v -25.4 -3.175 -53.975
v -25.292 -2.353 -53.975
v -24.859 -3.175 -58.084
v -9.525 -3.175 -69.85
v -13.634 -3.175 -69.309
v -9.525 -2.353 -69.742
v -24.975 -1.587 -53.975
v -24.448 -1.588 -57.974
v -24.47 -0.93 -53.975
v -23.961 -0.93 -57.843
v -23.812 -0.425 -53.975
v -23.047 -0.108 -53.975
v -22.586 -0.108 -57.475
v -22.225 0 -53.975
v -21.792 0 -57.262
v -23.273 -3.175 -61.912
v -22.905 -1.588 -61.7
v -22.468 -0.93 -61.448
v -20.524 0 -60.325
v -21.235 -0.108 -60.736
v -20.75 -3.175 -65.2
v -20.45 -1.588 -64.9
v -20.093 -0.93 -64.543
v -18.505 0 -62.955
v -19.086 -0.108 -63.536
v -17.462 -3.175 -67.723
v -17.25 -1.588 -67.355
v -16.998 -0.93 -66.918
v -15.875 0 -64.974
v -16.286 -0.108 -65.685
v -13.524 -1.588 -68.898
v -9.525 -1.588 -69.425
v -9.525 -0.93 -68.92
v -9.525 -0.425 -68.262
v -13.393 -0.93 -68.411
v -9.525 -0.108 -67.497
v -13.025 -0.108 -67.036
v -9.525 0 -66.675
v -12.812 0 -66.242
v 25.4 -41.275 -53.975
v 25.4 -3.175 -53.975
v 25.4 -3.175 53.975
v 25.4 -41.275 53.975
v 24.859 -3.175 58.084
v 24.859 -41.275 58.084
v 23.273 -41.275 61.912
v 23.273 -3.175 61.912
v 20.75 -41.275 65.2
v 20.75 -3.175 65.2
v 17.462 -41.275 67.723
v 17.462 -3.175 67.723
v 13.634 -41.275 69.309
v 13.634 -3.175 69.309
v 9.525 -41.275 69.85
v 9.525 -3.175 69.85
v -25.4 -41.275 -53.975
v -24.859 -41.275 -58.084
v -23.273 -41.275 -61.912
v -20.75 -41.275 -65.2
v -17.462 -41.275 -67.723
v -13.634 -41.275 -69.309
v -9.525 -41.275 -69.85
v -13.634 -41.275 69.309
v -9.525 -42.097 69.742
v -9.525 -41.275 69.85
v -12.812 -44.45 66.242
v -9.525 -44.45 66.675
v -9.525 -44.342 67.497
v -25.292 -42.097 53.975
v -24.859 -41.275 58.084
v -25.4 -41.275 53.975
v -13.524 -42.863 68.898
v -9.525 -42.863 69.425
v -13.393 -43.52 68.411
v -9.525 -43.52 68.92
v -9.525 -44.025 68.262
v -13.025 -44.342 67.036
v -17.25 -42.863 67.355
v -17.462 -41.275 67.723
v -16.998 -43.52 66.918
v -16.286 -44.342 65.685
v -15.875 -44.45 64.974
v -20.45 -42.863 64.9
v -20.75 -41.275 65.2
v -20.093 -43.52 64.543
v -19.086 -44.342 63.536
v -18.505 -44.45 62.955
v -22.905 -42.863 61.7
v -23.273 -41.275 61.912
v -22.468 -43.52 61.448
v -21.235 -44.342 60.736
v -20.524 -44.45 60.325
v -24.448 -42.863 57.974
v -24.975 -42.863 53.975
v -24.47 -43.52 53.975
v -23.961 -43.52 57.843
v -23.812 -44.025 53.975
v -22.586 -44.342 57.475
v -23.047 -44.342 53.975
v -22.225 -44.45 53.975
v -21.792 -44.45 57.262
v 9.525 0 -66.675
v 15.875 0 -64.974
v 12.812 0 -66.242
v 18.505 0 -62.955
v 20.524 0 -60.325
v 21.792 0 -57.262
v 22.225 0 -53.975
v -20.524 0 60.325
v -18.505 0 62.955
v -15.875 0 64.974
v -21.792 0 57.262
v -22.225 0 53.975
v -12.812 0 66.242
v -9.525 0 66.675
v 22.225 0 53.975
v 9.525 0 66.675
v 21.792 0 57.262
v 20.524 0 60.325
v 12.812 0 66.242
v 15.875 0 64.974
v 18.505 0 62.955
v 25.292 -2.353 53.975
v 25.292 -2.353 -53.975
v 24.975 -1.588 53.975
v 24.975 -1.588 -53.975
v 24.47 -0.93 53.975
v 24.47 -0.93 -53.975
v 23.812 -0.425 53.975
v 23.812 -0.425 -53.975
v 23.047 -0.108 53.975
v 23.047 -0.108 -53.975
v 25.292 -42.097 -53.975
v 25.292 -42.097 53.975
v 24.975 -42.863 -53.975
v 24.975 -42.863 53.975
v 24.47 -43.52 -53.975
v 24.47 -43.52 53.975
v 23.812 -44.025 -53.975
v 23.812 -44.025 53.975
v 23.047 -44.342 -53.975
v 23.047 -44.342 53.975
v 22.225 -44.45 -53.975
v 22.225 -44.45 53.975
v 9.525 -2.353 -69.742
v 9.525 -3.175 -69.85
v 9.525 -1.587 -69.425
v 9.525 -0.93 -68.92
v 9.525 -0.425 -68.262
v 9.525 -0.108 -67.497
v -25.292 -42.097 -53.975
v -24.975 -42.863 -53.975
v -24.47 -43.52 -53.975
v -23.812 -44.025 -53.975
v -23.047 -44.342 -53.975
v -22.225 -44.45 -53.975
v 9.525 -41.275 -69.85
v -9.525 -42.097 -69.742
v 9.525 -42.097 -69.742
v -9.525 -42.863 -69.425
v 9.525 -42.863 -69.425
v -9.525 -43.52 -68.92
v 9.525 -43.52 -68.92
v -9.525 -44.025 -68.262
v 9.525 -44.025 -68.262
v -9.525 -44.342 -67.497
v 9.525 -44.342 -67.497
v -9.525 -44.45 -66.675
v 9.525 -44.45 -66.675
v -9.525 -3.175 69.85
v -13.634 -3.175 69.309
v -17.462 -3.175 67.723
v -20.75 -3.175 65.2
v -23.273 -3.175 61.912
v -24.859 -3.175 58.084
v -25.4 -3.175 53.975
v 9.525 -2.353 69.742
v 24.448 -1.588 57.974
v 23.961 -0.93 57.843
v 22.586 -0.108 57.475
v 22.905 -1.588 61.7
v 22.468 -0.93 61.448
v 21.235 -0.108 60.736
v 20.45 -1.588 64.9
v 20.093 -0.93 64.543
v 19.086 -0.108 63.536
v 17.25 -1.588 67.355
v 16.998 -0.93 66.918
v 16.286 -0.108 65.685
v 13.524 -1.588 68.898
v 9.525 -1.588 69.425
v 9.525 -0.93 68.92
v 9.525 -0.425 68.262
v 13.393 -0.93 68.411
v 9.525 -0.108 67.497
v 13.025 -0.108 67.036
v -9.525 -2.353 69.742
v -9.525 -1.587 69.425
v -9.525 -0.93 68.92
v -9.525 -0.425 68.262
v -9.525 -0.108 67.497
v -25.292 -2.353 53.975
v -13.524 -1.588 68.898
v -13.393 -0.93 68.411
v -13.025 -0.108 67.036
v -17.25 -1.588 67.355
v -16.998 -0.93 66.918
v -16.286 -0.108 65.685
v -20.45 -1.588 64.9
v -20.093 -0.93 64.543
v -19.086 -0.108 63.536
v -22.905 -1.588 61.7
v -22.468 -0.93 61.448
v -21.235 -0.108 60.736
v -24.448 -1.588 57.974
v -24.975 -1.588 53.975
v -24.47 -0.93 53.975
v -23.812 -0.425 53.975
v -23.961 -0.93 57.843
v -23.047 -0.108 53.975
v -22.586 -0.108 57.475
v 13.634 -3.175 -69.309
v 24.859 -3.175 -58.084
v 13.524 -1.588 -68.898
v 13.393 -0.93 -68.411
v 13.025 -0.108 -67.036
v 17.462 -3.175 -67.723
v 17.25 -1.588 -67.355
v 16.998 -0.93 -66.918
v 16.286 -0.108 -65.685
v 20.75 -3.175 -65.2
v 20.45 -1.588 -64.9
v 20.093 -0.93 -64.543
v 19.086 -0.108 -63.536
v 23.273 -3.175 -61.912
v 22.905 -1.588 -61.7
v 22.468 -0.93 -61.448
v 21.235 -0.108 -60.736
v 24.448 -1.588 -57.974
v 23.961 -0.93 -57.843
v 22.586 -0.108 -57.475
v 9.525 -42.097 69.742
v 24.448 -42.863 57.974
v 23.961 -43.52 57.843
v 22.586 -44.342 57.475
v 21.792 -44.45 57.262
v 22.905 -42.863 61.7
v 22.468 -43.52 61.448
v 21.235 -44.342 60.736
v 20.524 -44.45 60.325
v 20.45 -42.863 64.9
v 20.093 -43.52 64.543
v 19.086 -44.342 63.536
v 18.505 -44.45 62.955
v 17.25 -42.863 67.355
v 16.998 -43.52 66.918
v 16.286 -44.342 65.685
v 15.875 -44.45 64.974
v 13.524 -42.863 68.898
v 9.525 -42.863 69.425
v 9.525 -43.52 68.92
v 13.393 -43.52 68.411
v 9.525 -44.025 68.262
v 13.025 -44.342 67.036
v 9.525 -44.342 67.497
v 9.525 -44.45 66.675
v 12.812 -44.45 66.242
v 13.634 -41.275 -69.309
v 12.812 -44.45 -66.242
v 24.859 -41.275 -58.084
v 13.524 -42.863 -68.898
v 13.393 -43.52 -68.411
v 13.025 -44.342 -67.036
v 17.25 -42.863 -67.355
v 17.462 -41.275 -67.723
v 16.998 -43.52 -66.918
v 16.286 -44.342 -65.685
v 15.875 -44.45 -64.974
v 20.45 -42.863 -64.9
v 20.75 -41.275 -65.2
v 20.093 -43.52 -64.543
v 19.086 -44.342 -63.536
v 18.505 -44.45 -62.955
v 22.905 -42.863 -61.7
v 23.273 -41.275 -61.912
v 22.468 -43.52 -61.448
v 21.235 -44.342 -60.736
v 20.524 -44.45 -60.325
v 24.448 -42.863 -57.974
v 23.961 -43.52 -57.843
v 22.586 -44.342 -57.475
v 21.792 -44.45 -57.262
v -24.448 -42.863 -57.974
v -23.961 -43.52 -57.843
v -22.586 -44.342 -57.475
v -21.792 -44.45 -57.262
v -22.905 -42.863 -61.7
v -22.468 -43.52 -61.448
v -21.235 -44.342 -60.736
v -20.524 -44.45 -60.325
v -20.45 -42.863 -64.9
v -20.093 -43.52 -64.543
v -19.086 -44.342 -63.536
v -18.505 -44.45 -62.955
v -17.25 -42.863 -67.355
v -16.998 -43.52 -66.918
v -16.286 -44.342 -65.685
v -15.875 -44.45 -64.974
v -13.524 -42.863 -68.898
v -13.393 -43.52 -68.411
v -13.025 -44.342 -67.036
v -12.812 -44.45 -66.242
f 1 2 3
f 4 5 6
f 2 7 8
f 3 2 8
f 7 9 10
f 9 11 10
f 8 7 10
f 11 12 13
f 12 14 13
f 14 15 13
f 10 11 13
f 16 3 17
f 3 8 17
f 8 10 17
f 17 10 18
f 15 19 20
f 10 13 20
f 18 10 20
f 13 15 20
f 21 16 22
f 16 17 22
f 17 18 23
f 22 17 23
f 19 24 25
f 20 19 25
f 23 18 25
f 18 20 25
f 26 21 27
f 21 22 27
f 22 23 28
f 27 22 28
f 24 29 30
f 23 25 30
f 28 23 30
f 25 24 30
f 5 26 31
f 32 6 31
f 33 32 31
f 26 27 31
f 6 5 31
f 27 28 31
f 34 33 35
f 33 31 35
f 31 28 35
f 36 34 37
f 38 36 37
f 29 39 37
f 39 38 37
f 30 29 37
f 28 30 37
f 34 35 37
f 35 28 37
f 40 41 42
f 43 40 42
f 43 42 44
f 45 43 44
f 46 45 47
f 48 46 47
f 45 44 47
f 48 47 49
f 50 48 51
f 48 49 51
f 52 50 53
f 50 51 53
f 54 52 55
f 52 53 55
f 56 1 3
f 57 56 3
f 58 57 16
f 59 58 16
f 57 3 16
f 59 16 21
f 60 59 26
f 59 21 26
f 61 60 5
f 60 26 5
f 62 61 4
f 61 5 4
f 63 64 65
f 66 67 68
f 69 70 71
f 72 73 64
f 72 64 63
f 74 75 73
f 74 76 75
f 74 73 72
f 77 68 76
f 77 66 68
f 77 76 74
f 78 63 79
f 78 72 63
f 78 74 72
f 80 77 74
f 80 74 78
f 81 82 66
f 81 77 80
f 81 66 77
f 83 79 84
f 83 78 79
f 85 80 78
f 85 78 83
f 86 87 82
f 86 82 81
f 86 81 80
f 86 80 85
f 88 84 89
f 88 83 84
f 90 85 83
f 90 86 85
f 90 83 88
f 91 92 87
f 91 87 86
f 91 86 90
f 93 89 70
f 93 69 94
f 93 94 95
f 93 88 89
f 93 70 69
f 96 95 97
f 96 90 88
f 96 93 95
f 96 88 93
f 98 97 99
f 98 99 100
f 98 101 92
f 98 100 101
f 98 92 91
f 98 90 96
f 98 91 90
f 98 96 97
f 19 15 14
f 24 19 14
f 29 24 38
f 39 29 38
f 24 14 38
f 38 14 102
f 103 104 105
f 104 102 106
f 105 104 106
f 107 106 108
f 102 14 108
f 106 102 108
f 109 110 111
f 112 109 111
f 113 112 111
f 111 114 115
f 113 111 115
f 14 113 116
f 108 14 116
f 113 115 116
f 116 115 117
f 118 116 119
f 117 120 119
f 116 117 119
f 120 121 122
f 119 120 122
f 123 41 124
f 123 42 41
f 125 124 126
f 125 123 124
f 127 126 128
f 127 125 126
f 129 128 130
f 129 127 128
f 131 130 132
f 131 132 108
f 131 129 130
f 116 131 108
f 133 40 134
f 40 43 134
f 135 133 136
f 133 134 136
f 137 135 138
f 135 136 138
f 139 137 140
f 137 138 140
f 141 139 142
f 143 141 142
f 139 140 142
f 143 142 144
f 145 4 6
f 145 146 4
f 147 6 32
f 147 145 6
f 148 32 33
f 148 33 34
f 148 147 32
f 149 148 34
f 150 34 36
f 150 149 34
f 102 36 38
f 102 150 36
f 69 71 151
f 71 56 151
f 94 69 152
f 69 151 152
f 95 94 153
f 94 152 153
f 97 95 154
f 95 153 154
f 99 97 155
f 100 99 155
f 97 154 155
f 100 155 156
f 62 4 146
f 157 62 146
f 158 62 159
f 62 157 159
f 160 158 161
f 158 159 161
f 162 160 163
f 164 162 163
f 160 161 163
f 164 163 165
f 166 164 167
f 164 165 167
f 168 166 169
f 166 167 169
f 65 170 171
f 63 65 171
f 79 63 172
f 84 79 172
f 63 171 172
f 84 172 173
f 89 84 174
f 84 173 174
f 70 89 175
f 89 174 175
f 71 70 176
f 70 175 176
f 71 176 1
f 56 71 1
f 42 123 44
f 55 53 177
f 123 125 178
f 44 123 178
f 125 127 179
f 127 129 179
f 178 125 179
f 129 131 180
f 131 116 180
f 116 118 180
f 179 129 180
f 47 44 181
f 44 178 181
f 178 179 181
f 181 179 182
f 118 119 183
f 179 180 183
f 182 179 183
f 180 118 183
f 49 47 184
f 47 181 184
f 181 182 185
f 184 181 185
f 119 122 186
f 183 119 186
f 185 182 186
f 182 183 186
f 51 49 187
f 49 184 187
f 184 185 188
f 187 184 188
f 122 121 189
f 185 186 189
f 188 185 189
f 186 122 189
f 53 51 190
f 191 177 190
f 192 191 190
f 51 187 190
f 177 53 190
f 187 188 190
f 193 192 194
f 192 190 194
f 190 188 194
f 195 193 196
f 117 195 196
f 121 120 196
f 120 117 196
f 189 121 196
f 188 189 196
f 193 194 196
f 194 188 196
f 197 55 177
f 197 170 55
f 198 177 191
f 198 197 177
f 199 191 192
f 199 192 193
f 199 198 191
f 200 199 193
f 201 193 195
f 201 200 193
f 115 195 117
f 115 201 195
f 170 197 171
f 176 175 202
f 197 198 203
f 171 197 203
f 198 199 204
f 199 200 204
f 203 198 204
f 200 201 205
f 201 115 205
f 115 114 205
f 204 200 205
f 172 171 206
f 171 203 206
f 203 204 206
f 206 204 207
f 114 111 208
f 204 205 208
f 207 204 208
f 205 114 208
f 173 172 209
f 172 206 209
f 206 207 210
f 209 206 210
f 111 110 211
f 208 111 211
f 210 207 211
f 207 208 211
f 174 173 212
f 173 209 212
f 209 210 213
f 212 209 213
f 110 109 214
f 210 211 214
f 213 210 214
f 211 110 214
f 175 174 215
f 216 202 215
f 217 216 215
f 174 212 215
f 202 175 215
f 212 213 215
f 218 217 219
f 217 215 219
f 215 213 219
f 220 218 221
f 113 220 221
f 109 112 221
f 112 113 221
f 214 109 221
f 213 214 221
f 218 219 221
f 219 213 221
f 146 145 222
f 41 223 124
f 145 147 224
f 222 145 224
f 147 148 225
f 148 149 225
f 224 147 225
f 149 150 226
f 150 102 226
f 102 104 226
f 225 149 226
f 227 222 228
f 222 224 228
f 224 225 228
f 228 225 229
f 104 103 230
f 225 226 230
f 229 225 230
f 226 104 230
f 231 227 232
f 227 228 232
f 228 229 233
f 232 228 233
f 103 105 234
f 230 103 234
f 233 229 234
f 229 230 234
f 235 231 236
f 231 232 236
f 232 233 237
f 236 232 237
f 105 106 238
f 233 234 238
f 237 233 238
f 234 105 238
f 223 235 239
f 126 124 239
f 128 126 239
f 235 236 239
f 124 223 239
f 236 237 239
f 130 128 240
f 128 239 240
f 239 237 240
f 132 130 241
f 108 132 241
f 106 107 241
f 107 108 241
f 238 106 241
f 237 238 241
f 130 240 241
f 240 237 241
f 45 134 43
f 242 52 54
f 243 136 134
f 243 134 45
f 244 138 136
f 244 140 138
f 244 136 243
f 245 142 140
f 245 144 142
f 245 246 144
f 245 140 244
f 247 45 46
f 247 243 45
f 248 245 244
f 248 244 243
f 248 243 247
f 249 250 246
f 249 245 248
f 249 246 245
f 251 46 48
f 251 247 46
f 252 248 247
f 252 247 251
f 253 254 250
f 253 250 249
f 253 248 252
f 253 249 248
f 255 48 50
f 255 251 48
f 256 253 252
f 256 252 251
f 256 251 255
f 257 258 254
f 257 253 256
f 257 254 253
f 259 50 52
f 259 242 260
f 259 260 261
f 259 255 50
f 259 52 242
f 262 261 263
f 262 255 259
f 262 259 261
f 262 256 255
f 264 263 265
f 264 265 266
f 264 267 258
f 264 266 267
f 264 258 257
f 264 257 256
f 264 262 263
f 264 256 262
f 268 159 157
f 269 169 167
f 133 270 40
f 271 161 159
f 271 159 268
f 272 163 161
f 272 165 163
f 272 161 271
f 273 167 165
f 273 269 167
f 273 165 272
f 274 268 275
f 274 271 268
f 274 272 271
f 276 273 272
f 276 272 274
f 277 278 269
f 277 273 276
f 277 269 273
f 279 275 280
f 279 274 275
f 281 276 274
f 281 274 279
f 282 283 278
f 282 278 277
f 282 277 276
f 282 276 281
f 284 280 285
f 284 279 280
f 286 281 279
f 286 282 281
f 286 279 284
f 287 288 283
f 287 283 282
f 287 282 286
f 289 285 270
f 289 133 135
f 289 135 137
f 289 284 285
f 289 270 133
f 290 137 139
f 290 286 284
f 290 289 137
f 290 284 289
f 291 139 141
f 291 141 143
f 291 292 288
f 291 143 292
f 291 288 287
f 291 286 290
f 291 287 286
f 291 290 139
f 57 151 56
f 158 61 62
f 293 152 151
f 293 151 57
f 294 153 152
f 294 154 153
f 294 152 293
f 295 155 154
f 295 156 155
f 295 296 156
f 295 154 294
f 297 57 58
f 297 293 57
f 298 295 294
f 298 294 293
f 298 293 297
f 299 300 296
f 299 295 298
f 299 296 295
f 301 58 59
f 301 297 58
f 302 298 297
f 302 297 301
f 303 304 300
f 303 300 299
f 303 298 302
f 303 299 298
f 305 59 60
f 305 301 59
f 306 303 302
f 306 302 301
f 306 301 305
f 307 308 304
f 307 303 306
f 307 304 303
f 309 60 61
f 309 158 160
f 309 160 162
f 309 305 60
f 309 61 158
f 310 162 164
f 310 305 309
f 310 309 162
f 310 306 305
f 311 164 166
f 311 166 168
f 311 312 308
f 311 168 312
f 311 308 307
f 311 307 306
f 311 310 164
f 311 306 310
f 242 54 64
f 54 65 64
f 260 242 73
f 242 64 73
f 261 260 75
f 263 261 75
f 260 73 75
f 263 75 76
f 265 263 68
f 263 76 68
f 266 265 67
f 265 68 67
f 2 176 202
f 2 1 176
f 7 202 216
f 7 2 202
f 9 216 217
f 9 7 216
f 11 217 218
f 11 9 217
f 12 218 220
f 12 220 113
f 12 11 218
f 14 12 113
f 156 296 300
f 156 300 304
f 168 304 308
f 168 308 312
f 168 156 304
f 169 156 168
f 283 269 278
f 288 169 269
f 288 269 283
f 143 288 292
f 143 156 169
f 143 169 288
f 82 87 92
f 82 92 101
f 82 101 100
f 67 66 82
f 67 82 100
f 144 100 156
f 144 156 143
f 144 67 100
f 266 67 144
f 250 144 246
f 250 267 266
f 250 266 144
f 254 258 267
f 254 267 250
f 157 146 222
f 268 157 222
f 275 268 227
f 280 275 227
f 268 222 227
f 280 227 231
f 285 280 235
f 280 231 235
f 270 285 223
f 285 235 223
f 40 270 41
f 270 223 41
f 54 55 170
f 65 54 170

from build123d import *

# Parameters (mm, degrees)
F1_DEPTH = 44.45
F2_R     = 3.175


with BuildPart() as f1:
    # F0 (on Front) → F1 (new body)
    with BuildSketch(Plane.XZ):
        with BuildLine():
            ThreePointArc((25.4, 53.975), (20.75032, 65.20032), (9.525, 69.85))
            Line((9.525, 69.85), (-9.525, 69.85))
            ThreePointArc((-9.525, 69.85), (-20.75032, 65.20032), (-25.4, 53.975))
            Line((-25.4, 53.975), (-25.4, -53.975))
            ThreePointArc((-25.4, -53.975), (-20.75032, -65.20032), (-9.525, -69.85))
            Line((-9.525, -69.85), (9.525, -69.85))
            ThreePointArc((9.525, -69.85), (20.75032, -65.20032), (25.4, -53.975))
            Line((25.4, -53.975), (25.4, 53.975))
        make_face()
    extrude(amount=F1_DEPTH)

    # F2
    f2_edges = [f1.edges().sort_by_distance(p)[0] for p in [
        (20.75032, -44.45, 65.20032),
        (0, -44.45, 69.85),
        (-20.75032, -44.45, 65.20032),
        (25.4, -44.45, 0),
        (20.75032, -44.45, -65.20032),
        (0, -44.45, -69.85),
        (-20.75032, -44.45, -65.20032),
        (-25.4, -44.45, 0),
        (20.75032, 0, 65.20032),
        (25.4, 0, 0),
        (20.75032, 0, -65.20032),
        (0, 0, 69.85),
        (-20.75032, 0, 65.20032),
        (0, 0, -69.85),
        (-20.75032, 0, -65.20032),
        (-25.4, 0, 0),
    ]]
    fillet(f2_edges, radius=F2_R)


solid = f1.part
